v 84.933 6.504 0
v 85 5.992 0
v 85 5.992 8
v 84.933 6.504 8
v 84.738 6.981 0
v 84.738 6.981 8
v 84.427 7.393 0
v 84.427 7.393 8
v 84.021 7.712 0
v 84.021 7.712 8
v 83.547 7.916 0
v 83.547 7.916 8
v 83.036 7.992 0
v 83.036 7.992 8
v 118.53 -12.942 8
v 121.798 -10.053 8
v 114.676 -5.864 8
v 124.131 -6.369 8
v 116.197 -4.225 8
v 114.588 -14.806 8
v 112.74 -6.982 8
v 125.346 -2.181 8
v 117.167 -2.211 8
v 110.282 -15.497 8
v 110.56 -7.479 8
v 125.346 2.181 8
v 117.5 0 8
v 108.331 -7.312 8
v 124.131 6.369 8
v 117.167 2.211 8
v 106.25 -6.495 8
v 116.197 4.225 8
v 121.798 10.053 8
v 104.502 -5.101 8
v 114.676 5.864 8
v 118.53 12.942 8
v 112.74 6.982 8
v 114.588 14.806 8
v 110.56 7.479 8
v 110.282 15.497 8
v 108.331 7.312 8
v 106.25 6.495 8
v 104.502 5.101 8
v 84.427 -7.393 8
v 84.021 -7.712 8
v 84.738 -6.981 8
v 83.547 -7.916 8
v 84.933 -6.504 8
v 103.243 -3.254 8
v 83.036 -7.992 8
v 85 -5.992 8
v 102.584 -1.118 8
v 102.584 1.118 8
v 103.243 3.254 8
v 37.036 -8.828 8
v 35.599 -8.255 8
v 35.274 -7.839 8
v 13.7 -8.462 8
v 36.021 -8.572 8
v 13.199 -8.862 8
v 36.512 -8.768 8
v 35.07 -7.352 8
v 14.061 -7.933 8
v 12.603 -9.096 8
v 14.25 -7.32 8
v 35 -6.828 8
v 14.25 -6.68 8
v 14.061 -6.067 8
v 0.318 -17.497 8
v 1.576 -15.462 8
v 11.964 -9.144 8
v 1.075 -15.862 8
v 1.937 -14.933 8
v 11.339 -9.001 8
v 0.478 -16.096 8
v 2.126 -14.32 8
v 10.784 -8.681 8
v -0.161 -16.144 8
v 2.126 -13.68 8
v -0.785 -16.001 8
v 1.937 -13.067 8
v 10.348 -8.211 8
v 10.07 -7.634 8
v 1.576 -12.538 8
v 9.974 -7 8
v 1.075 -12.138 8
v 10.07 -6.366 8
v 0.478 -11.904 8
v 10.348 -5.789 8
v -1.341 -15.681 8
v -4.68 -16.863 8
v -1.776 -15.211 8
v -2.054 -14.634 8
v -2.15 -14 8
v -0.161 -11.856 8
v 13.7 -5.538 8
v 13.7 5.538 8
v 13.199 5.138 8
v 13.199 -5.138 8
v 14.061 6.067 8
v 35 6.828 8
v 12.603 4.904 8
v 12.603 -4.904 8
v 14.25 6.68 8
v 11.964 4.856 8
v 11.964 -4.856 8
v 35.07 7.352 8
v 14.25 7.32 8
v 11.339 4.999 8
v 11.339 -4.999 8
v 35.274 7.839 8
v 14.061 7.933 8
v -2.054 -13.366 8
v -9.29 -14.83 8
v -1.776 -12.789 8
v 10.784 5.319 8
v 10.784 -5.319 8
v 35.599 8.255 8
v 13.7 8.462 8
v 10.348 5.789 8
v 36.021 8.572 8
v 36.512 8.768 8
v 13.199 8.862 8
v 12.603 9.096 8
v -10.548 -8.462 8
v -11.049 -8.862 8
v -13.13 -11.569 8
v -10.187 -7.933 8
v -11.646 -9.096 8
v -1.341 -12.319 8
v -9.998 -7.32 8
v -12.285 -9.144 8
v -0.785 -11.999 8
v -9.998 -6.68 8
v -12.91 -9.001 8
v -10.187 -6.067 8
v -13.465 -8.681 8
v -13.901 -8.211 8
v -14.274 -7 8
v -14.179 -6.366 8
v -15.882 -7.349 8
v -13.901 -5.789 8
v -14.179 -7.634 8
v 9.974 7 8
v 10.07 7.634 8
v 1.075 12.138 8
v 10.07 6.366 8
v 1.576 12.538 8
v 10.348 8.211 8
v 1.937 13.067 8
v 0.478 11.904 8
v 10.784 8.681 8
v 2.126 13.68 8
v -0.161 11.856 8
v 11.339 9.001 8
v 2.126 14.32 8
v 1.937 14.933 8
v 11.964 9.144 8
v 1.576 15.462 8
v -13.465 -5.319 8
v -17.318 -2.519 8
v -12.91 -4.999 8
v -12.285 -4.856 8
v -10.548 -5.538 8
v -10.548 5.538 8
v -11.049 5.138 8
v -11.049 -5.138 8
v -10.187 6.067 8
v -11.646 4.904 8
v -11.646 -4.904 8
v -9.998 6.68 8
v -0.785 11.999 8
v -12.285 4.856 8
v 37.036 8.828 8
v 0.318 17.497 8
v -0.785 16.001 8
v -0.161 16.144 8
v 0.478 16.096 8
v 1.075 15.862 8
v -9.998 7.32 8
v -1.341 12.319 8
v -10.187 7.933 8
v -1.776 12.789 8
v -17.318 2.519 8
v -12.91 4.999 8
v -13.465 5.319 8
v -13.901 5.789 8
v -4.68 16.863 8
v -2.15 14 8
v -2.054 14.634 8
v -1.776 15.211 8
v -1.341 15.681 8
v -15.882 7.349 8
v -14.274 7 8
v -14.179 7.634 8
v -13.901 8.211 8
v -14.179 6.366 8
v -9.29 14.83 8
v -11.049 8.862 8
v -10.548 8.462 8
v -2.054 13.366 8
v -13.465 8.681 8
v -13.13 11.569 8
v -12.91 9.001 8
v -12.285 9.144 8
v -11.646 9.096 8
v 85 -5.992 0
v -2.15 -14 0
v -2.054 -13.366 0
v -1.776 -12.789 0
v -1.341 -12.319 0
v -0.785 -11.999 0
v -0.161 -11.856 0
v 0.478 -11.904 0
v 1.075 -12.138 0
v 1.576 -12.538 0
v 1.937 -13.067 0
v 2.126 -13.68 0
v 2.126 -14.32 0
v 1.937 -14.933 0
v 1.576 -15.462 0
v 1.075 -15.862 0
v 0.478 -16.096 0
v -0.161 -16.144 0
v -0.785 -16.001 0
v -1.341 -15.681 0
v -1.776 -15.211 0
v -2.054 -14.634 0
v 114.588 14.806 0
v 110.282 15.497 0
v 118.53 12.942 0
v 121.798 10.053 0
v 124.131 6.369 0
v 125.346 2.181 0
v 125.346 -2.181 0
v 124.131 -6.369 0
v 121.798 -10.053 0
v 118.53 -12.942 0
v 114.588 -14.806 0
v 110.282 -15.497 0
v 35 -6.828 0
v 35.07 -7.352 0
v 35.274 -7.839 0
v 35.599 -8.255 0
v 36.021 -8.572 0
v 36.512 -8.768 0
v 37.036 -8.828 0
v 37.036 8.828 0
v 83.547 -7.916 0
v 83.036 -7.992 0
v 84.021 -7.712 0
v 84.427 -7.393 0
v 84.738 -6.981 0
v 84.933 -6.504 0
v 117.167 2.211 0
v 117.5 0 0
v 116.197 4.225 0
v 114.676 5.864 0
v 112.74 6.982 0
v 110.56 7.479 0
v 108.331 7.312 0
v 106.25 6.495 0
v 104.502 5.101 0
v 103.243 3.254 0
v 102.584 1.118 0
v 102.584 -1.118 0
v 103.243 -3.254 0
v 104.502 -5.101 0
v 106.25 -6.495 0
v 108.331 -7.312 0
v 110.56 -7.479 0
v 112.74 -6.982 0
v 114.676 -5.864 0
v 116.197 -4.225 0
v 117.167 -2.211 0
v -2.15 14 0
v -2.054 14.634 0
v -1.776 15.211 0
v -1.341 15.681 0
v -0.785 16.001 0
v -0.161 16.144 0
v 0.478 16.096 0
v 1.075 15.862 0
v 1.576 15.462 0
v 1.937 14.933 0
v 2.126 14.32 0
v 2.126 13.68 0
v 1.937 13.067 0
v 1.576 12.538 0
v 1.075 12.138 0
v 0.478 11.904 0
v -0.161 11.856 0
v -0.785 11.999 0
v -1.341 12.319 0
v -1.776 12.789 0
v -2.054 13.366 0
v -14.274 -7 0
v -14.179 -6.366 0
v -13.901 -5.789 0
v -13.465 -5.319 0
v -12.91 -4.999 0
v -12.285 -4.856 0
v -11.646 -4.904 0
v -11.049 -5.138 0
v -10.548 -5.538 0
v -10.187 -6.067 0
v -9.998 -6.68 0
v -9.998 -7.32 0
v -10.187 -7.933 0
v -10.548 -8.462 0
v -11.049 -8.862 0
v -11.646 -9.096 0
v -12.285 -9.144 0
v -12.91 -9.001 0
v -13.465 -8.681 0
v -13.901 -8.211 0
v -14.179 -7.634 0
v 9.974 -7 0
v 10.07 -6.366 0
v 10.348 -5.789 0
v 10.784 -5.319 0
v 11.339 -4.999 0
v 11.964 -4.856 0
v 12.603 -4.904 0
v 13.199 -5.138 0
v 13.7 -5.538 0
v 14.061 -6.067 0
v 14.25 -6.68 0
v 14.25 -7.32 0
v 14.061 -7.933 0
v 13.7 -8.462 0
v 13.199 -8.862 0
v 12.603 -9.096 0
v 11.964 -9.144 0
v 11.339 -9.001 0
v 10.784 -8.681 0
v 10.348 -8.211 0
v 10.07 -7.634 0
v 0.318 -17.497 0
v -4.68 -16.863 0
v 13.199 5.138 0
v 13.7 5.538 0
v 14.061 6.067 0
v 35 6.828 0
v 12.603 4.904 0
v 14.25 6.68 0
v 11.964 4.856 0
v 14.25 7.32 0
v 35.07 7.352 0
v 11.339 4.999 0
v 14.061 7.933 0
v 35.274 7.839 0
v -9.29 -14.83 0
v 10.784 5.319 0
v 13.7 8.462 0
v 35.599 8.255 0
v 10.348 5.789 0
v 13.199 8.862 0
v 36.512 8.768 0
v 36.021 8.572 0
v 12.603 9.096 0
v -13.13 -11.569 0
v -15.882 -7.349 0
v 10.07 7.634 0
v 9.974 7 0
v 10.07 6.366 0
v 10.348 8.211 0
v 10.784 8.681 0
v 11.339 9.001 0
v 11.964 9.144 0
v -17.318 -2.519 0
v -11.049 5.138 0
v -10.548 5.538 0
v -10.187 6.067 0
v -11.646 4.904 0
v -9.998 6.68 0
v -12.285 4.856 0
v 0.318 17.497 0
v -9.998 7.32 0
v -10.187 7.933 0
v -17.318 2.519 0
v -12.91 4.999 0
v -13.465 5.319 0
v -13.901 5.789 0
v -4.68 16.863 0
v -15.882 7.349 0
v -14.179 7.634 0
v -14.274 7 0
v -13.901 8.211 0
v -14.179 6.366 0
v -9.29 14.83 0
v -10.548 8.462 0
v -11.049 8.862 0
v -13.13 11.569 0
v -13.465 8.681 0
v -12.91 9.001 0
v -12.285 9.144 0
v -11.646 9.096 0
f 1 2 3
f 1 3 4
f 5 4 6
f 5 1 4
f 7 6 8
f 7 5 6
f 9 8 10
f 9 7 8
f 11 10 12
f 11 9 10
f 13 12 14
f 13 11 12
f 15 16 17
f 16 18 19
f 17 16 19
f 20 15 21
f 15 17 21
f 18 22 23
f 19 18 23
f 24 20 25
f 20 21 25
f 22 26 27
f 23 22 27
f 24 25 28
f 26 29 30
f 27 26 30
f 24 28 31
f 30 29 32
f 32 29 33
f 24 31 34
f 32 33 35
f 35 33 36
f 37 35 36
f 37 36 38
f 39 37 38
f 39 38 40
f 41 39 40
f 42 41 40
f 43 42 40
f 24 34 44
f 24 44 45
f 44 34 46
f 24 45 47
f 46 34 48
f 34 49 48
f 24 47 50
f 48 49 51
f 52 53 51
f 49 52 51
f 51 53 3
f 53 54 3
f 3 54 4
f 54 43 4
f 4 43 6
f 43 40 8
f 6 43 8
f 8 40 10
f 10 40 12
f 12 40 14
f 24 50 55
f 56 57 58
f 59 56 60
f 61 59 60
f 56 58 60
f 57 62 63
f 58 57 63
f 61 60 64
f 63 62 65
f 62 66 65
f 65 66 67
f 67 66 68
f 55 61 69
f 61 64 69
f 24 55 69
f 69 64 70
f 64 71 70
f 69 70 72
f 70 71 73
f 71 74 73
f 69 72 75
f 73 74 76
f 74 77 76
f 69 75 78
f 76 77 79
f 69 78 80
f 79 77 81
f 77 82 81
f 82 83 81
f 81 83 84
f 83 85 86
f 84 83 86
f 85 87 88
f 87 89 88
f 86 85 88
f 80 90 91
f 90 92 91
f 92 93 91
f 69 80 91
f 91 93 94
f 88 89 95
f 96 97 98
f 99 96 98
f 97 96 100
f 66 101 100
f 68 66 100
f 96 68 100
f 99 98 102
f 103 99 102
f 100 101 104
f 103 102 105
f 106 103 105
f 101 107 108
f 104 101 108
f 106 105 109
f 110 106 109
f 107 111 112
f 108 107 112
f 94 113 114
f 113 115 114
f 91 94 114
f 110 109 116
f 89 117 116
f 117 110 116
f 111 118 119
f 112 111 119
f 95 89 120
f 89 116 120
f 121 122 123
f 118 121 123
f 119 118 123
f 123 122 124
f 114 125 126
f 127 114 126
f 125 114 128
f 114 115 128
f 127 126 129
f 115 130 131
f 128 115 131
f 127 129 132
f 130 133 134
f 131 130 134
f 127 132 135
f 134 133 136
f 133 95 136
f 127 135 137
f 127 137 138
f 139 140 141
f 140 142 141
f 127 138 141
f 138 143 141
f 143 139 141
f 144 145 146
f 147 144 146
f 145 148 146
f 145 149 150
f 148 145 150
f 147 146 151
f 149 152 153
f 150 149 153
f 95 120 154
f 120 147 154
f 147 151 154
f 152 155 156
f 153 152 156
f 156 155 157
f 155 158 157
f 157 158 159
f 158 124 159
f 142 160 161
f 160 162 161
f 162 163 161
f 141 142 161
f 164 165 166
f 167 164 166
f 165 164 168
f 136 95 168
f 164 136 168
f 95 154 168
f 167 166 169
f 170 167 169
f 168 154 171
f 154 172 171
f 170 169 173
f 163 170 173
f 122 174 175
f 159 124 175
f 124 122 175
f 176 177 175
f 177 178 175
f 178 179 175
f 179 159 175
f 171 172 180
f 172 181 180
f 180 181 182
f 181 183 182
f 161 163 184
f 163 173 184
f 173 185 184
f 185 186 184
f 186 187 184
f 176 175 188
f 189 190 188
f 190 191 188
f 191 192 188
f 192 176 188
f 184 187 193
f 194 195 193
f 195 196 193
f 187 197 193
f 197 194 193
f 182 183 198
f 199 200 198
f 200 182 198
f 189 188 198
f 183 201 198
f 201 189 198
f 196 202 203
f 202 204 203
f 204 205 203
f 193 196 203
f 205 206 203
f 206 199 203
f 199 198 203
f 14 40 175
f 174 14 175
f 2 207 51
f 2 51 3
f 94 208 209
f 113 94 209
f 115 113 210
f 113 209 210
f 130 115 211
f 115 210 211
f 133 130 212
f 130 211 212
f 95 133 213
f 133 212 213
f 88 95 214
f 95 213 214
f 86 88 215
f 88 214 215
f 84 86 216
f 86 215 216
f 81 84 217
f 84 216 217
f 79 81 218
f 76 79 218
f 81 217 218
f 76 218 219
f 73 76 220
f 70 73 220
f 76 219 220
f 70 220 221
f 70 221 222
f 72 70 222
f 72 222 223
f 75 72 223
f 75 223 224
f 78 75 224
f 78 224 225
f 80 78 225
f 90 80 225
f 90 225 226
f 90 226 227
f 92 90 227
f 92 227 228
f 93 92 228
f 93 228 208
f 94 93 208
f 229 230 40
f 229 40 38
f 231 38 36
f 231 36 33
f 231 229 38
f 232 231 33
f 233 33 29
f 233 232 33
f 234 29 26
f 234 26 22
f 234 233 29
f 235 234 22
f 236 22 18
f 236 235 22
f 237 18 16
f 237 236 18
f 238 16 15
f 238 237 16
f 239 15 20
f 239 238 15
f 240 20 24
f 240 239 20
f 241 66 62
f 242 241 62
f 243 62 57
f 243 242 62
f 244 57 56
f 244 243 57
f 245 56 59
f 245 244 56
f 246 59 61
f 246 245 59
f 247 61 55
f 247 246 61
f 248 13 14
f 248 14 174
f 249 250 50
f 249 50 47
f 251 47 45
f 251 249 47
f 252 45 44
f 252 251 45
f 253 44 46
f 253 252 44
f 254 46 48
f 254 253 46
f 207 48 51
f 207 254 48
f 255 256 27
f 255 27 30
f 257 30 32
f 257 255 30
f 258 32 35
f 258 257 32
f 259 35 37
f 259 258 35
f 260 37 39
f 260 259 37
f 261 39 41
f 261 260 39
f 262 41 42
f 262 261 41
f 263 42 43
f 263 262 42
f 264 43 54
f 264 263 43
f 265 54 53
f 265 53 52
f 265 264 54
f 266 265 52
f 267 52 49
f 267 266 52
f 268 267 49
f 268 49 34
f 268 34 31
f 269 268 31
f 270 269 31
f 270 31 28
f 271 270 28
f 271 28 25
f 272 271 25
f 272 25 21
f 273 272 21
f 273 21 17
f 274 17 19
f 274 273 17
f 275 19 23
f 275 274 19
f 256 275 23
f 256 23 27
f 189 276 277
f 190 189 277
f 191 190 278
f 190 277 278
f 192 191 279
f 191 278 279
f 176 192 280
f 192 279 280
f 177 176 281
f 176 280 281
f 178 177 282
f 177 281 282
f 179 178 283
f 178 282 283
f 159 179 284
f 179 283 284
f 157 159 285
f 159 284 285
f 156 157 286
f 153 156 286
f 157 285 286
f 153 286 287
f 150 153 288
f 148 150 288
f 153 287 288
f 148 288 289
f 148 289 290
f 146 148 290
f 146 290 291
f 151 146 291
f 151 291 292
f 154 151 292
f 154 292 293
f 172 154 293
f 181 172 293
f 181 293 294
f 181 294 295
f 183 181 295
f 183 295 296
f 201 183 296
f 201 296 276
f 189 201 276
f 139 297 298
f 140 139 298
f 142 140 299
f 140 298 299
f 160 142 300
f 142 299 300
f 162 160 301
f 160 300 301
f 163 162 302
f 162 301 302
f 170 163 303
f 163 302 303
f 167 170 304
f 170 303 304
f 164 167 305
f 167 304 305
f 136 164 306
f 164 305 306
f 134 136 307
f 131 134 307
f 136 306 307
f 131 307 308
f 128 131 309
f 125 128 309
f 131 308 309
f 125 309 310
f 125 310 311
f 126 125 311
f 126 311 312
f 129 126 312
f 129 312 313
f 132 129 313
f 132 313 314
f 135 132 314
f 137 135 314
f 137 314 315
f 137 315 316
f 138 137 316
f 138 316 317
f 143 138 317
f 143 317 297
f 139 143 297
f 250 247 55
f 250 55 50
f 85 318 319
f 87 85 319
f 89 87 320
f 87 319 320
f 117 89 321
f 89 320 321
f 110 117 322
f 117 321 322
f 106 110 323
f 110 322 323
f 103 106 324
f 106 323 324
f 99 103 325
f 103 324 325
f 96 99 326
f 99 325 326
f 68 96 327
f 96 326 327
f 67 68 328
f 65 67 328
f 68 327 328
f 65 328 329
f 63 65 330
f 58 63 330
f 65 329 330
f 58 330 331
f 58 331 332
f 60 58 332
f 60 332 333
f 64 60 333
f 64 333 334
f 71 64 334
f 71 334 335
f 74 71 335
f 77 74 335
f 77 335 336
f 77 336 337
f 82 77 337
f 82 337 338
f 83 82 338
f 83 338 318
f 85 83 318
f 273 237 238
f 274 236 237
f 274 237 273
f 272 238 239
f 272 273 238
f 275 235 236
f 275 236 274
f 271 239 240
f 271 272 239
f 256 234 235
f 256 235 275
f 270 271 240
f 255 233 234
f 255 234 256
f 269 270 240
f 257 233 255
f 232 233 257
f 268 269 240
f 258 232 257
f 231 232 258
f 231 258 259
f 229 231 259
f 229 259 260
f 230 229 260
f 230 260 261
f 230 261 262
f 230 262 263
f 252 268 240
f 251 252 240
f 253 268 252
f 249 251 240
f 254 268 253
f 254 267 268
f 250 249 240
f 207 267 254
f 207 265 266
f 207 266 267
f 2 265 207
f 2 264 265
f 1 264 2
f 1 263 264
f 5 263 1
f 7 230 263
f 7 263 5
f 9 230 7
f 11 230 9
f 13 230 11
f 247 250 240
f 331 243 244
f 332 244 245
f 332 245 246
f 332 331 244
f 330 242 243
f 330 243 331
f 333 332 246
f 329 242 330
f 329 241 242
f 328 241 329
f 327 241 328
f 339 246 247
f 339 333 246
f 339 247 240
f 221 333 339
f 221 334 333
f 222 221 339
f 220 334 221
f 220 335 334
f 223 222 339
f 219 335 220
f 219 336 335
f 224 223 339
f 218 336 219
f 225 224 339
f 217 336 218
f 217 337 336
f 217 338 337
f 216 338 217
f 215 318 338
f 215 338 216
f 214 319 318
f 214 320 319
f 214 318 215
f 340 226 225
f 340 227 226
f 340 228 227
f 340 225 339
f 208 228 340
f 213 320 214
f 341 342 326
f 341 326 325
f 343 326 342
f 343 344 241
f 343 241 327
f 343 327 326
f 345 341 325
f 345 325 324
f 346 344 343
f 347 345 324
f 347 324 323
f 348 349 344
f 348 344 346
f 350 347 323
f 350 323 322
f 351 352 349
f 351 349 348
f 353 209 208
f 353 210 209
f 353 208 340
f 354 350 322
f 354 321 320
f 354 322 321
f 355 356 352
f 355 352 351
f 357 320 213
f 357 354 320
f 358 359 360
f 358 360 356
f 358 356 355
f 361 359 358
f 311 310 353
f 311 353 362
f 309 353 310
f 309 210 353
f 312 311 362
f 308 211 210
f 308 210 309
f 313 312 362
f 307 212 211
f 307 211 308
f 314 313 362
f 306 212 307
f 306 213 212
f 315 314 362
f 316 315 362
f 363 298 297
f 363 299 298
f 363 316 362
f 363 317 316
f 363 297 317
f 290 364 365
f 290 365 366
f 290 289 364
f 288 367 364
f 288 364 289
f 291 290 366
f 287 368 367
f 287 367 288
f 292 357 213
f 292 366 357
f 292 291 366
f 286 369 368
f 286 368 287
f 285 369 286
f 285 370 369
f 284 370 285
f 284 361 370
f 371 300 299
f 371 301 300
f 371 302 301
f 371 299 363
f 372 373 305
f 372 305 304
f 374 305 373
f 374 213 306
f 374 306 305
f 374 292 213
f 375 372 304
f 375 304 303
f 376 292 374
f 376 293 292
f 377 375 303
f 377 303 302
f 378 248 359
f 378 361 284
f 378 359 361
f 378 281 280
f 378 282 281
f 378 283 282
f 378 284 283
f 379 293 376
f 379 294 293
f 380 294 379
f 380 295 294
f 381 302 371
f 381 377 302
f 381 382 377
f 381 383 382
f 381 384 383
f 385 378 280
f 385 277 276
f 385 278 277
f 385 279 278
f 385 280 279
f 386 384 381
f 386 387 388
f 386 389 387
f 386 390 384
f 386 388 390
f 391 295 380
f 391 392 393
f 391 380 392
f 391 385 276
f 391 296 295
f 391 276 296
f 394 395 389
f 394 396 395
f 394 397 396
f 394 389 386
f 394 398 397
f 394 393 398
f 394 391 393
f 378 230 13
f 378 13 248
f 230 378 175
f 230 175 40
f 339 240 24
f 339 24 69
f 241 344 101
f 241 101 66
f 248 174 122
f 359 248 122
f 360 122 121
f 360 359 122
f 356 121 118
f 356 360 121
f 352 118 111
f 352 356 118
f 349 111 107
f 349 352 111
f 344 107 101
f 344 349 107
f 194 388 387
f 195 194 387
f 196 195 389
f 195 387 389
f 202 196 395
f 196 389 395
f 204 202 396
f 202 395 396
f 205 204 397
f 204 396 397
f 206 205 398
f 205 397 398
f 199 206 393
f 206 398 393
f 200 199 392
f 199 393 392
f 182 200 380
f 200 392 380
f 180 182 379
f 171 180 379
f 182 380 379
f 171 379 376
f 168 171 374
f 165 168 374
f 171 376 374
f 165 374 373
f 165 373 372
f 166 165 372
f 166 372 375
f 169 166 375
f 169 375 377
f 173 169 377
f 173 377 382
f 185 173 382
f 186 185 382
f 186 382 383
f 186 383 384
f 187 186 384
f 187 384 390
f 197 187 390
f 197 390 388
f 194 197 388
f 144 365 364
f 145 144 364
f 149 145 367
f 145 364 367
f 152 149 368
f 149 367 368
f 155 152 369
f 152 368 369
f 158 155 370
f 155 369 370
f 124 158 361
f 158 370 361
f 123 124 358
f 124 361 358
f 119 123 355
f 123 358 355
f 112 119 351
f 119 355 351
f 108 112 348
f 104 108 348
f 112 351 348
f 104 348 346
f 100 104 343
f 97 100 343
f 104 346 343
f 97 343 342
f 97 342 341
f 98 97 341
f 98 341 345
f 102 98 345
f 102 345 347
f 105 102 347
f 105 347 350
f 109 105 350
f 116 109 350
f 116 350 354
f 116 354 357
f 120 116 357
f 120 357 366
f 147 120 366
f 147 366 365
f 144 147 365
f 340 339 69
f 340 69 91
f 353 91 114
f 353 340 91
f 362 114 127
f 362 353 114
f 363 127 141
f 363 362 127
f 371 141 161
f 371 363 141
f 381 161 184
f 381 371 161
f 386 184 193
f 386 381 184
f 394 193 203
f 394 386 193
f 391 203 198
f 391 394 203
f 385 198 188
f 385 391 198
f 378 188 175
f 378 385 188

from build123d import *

# Parameters (mm, degrees)
SKETCH1_R                = 7.5
BOSS_EXTRUDE1_DEPTH      = 8
M4_CLEARANCE_HOLE1_D     = 4.3
M4_CLEARANCE_HOLE1_DEPTH = 25
M4_CLEARANCE_HOLE1_TIP   = 1.291850331


with BuildPart() as part:
    # Sketch1 → Boss-Extrude1 (new body)
    with BuildSketch(Plane.XY):
        with BuildLine():
            Line((0.318181818, 17.497107199), (110.281818182, 15.497437805))
            ThreePointArc((110.281818182, 15.497437805), (125.5, 0), (110.281818182, -15.497437805))
            Line((110.281818182, -15.497437805), (0.318181818, -17.497107199))
            ThreePointArc((0.318181818, -17.497107199), (-17.5, 0), (0.318181818, 17.497107199))
        make_face()
        with Locations((110, 0)):
            Circle(SKETCH1_R, mode=Mode.SUBTRACT)
        with BuildLine():
            Line((35, 6.828401482), (35, -6.828401482))
            ThreePointArc((35, -6.828401482), (35.598701901, -8.255413618), (37.036363636, -8.828070876))
            Line((37.036363636, -8.828070876), (83.036363636, -7.991568964))
            ThreePointArc((83.036363636, -7.991568964), (84.427012136, -7.393197669), (85, -5.991899569))
            Line((85, -5.991899569), (85, 5.991899569))
            ThreePointArc((85, 5.991899569), (84.427012136, 7.393197669), (83.036363636, 7.991568964))
            Line((83.036363636, 7.991568964), (37.036363636, 8.828070876))
            ThreePointArc((37.036363636, 8.828070876), (35.598701901, 8.255413618), (35, 6.828401482))
        make_face(mode=Mode.SUBTRACT)
    extrude(amount=BOSS_EXTRUDE1_DEPTH)

    # M4 Clearance Hole1
    with Locations(Plane.XY.offset(8)):
        with Locations((12.124355653, 7), (0, 14), (-12.124355653, 7), (-12.124355653, -7), (0, -14), (12.124355653, -7)):
            Hole(M4_CLEARANCE_HOLE1_D / 2, depth=M4_CLEARANCE_HOLE1_DEPTH)
            with Locations((0, 0, -(M4_CLEARANCE_HOLE1_DEPTH + M4_CLEARANCE_HOLE1_TIP / 2))):  # 118° drill point
                Cone(0, M4_CLEARANCE_HOLE1_D / 2, M4_CLEARANCE_HOLE1_TIP, mode=Mode.SUBTRACT)


solid = part.part
